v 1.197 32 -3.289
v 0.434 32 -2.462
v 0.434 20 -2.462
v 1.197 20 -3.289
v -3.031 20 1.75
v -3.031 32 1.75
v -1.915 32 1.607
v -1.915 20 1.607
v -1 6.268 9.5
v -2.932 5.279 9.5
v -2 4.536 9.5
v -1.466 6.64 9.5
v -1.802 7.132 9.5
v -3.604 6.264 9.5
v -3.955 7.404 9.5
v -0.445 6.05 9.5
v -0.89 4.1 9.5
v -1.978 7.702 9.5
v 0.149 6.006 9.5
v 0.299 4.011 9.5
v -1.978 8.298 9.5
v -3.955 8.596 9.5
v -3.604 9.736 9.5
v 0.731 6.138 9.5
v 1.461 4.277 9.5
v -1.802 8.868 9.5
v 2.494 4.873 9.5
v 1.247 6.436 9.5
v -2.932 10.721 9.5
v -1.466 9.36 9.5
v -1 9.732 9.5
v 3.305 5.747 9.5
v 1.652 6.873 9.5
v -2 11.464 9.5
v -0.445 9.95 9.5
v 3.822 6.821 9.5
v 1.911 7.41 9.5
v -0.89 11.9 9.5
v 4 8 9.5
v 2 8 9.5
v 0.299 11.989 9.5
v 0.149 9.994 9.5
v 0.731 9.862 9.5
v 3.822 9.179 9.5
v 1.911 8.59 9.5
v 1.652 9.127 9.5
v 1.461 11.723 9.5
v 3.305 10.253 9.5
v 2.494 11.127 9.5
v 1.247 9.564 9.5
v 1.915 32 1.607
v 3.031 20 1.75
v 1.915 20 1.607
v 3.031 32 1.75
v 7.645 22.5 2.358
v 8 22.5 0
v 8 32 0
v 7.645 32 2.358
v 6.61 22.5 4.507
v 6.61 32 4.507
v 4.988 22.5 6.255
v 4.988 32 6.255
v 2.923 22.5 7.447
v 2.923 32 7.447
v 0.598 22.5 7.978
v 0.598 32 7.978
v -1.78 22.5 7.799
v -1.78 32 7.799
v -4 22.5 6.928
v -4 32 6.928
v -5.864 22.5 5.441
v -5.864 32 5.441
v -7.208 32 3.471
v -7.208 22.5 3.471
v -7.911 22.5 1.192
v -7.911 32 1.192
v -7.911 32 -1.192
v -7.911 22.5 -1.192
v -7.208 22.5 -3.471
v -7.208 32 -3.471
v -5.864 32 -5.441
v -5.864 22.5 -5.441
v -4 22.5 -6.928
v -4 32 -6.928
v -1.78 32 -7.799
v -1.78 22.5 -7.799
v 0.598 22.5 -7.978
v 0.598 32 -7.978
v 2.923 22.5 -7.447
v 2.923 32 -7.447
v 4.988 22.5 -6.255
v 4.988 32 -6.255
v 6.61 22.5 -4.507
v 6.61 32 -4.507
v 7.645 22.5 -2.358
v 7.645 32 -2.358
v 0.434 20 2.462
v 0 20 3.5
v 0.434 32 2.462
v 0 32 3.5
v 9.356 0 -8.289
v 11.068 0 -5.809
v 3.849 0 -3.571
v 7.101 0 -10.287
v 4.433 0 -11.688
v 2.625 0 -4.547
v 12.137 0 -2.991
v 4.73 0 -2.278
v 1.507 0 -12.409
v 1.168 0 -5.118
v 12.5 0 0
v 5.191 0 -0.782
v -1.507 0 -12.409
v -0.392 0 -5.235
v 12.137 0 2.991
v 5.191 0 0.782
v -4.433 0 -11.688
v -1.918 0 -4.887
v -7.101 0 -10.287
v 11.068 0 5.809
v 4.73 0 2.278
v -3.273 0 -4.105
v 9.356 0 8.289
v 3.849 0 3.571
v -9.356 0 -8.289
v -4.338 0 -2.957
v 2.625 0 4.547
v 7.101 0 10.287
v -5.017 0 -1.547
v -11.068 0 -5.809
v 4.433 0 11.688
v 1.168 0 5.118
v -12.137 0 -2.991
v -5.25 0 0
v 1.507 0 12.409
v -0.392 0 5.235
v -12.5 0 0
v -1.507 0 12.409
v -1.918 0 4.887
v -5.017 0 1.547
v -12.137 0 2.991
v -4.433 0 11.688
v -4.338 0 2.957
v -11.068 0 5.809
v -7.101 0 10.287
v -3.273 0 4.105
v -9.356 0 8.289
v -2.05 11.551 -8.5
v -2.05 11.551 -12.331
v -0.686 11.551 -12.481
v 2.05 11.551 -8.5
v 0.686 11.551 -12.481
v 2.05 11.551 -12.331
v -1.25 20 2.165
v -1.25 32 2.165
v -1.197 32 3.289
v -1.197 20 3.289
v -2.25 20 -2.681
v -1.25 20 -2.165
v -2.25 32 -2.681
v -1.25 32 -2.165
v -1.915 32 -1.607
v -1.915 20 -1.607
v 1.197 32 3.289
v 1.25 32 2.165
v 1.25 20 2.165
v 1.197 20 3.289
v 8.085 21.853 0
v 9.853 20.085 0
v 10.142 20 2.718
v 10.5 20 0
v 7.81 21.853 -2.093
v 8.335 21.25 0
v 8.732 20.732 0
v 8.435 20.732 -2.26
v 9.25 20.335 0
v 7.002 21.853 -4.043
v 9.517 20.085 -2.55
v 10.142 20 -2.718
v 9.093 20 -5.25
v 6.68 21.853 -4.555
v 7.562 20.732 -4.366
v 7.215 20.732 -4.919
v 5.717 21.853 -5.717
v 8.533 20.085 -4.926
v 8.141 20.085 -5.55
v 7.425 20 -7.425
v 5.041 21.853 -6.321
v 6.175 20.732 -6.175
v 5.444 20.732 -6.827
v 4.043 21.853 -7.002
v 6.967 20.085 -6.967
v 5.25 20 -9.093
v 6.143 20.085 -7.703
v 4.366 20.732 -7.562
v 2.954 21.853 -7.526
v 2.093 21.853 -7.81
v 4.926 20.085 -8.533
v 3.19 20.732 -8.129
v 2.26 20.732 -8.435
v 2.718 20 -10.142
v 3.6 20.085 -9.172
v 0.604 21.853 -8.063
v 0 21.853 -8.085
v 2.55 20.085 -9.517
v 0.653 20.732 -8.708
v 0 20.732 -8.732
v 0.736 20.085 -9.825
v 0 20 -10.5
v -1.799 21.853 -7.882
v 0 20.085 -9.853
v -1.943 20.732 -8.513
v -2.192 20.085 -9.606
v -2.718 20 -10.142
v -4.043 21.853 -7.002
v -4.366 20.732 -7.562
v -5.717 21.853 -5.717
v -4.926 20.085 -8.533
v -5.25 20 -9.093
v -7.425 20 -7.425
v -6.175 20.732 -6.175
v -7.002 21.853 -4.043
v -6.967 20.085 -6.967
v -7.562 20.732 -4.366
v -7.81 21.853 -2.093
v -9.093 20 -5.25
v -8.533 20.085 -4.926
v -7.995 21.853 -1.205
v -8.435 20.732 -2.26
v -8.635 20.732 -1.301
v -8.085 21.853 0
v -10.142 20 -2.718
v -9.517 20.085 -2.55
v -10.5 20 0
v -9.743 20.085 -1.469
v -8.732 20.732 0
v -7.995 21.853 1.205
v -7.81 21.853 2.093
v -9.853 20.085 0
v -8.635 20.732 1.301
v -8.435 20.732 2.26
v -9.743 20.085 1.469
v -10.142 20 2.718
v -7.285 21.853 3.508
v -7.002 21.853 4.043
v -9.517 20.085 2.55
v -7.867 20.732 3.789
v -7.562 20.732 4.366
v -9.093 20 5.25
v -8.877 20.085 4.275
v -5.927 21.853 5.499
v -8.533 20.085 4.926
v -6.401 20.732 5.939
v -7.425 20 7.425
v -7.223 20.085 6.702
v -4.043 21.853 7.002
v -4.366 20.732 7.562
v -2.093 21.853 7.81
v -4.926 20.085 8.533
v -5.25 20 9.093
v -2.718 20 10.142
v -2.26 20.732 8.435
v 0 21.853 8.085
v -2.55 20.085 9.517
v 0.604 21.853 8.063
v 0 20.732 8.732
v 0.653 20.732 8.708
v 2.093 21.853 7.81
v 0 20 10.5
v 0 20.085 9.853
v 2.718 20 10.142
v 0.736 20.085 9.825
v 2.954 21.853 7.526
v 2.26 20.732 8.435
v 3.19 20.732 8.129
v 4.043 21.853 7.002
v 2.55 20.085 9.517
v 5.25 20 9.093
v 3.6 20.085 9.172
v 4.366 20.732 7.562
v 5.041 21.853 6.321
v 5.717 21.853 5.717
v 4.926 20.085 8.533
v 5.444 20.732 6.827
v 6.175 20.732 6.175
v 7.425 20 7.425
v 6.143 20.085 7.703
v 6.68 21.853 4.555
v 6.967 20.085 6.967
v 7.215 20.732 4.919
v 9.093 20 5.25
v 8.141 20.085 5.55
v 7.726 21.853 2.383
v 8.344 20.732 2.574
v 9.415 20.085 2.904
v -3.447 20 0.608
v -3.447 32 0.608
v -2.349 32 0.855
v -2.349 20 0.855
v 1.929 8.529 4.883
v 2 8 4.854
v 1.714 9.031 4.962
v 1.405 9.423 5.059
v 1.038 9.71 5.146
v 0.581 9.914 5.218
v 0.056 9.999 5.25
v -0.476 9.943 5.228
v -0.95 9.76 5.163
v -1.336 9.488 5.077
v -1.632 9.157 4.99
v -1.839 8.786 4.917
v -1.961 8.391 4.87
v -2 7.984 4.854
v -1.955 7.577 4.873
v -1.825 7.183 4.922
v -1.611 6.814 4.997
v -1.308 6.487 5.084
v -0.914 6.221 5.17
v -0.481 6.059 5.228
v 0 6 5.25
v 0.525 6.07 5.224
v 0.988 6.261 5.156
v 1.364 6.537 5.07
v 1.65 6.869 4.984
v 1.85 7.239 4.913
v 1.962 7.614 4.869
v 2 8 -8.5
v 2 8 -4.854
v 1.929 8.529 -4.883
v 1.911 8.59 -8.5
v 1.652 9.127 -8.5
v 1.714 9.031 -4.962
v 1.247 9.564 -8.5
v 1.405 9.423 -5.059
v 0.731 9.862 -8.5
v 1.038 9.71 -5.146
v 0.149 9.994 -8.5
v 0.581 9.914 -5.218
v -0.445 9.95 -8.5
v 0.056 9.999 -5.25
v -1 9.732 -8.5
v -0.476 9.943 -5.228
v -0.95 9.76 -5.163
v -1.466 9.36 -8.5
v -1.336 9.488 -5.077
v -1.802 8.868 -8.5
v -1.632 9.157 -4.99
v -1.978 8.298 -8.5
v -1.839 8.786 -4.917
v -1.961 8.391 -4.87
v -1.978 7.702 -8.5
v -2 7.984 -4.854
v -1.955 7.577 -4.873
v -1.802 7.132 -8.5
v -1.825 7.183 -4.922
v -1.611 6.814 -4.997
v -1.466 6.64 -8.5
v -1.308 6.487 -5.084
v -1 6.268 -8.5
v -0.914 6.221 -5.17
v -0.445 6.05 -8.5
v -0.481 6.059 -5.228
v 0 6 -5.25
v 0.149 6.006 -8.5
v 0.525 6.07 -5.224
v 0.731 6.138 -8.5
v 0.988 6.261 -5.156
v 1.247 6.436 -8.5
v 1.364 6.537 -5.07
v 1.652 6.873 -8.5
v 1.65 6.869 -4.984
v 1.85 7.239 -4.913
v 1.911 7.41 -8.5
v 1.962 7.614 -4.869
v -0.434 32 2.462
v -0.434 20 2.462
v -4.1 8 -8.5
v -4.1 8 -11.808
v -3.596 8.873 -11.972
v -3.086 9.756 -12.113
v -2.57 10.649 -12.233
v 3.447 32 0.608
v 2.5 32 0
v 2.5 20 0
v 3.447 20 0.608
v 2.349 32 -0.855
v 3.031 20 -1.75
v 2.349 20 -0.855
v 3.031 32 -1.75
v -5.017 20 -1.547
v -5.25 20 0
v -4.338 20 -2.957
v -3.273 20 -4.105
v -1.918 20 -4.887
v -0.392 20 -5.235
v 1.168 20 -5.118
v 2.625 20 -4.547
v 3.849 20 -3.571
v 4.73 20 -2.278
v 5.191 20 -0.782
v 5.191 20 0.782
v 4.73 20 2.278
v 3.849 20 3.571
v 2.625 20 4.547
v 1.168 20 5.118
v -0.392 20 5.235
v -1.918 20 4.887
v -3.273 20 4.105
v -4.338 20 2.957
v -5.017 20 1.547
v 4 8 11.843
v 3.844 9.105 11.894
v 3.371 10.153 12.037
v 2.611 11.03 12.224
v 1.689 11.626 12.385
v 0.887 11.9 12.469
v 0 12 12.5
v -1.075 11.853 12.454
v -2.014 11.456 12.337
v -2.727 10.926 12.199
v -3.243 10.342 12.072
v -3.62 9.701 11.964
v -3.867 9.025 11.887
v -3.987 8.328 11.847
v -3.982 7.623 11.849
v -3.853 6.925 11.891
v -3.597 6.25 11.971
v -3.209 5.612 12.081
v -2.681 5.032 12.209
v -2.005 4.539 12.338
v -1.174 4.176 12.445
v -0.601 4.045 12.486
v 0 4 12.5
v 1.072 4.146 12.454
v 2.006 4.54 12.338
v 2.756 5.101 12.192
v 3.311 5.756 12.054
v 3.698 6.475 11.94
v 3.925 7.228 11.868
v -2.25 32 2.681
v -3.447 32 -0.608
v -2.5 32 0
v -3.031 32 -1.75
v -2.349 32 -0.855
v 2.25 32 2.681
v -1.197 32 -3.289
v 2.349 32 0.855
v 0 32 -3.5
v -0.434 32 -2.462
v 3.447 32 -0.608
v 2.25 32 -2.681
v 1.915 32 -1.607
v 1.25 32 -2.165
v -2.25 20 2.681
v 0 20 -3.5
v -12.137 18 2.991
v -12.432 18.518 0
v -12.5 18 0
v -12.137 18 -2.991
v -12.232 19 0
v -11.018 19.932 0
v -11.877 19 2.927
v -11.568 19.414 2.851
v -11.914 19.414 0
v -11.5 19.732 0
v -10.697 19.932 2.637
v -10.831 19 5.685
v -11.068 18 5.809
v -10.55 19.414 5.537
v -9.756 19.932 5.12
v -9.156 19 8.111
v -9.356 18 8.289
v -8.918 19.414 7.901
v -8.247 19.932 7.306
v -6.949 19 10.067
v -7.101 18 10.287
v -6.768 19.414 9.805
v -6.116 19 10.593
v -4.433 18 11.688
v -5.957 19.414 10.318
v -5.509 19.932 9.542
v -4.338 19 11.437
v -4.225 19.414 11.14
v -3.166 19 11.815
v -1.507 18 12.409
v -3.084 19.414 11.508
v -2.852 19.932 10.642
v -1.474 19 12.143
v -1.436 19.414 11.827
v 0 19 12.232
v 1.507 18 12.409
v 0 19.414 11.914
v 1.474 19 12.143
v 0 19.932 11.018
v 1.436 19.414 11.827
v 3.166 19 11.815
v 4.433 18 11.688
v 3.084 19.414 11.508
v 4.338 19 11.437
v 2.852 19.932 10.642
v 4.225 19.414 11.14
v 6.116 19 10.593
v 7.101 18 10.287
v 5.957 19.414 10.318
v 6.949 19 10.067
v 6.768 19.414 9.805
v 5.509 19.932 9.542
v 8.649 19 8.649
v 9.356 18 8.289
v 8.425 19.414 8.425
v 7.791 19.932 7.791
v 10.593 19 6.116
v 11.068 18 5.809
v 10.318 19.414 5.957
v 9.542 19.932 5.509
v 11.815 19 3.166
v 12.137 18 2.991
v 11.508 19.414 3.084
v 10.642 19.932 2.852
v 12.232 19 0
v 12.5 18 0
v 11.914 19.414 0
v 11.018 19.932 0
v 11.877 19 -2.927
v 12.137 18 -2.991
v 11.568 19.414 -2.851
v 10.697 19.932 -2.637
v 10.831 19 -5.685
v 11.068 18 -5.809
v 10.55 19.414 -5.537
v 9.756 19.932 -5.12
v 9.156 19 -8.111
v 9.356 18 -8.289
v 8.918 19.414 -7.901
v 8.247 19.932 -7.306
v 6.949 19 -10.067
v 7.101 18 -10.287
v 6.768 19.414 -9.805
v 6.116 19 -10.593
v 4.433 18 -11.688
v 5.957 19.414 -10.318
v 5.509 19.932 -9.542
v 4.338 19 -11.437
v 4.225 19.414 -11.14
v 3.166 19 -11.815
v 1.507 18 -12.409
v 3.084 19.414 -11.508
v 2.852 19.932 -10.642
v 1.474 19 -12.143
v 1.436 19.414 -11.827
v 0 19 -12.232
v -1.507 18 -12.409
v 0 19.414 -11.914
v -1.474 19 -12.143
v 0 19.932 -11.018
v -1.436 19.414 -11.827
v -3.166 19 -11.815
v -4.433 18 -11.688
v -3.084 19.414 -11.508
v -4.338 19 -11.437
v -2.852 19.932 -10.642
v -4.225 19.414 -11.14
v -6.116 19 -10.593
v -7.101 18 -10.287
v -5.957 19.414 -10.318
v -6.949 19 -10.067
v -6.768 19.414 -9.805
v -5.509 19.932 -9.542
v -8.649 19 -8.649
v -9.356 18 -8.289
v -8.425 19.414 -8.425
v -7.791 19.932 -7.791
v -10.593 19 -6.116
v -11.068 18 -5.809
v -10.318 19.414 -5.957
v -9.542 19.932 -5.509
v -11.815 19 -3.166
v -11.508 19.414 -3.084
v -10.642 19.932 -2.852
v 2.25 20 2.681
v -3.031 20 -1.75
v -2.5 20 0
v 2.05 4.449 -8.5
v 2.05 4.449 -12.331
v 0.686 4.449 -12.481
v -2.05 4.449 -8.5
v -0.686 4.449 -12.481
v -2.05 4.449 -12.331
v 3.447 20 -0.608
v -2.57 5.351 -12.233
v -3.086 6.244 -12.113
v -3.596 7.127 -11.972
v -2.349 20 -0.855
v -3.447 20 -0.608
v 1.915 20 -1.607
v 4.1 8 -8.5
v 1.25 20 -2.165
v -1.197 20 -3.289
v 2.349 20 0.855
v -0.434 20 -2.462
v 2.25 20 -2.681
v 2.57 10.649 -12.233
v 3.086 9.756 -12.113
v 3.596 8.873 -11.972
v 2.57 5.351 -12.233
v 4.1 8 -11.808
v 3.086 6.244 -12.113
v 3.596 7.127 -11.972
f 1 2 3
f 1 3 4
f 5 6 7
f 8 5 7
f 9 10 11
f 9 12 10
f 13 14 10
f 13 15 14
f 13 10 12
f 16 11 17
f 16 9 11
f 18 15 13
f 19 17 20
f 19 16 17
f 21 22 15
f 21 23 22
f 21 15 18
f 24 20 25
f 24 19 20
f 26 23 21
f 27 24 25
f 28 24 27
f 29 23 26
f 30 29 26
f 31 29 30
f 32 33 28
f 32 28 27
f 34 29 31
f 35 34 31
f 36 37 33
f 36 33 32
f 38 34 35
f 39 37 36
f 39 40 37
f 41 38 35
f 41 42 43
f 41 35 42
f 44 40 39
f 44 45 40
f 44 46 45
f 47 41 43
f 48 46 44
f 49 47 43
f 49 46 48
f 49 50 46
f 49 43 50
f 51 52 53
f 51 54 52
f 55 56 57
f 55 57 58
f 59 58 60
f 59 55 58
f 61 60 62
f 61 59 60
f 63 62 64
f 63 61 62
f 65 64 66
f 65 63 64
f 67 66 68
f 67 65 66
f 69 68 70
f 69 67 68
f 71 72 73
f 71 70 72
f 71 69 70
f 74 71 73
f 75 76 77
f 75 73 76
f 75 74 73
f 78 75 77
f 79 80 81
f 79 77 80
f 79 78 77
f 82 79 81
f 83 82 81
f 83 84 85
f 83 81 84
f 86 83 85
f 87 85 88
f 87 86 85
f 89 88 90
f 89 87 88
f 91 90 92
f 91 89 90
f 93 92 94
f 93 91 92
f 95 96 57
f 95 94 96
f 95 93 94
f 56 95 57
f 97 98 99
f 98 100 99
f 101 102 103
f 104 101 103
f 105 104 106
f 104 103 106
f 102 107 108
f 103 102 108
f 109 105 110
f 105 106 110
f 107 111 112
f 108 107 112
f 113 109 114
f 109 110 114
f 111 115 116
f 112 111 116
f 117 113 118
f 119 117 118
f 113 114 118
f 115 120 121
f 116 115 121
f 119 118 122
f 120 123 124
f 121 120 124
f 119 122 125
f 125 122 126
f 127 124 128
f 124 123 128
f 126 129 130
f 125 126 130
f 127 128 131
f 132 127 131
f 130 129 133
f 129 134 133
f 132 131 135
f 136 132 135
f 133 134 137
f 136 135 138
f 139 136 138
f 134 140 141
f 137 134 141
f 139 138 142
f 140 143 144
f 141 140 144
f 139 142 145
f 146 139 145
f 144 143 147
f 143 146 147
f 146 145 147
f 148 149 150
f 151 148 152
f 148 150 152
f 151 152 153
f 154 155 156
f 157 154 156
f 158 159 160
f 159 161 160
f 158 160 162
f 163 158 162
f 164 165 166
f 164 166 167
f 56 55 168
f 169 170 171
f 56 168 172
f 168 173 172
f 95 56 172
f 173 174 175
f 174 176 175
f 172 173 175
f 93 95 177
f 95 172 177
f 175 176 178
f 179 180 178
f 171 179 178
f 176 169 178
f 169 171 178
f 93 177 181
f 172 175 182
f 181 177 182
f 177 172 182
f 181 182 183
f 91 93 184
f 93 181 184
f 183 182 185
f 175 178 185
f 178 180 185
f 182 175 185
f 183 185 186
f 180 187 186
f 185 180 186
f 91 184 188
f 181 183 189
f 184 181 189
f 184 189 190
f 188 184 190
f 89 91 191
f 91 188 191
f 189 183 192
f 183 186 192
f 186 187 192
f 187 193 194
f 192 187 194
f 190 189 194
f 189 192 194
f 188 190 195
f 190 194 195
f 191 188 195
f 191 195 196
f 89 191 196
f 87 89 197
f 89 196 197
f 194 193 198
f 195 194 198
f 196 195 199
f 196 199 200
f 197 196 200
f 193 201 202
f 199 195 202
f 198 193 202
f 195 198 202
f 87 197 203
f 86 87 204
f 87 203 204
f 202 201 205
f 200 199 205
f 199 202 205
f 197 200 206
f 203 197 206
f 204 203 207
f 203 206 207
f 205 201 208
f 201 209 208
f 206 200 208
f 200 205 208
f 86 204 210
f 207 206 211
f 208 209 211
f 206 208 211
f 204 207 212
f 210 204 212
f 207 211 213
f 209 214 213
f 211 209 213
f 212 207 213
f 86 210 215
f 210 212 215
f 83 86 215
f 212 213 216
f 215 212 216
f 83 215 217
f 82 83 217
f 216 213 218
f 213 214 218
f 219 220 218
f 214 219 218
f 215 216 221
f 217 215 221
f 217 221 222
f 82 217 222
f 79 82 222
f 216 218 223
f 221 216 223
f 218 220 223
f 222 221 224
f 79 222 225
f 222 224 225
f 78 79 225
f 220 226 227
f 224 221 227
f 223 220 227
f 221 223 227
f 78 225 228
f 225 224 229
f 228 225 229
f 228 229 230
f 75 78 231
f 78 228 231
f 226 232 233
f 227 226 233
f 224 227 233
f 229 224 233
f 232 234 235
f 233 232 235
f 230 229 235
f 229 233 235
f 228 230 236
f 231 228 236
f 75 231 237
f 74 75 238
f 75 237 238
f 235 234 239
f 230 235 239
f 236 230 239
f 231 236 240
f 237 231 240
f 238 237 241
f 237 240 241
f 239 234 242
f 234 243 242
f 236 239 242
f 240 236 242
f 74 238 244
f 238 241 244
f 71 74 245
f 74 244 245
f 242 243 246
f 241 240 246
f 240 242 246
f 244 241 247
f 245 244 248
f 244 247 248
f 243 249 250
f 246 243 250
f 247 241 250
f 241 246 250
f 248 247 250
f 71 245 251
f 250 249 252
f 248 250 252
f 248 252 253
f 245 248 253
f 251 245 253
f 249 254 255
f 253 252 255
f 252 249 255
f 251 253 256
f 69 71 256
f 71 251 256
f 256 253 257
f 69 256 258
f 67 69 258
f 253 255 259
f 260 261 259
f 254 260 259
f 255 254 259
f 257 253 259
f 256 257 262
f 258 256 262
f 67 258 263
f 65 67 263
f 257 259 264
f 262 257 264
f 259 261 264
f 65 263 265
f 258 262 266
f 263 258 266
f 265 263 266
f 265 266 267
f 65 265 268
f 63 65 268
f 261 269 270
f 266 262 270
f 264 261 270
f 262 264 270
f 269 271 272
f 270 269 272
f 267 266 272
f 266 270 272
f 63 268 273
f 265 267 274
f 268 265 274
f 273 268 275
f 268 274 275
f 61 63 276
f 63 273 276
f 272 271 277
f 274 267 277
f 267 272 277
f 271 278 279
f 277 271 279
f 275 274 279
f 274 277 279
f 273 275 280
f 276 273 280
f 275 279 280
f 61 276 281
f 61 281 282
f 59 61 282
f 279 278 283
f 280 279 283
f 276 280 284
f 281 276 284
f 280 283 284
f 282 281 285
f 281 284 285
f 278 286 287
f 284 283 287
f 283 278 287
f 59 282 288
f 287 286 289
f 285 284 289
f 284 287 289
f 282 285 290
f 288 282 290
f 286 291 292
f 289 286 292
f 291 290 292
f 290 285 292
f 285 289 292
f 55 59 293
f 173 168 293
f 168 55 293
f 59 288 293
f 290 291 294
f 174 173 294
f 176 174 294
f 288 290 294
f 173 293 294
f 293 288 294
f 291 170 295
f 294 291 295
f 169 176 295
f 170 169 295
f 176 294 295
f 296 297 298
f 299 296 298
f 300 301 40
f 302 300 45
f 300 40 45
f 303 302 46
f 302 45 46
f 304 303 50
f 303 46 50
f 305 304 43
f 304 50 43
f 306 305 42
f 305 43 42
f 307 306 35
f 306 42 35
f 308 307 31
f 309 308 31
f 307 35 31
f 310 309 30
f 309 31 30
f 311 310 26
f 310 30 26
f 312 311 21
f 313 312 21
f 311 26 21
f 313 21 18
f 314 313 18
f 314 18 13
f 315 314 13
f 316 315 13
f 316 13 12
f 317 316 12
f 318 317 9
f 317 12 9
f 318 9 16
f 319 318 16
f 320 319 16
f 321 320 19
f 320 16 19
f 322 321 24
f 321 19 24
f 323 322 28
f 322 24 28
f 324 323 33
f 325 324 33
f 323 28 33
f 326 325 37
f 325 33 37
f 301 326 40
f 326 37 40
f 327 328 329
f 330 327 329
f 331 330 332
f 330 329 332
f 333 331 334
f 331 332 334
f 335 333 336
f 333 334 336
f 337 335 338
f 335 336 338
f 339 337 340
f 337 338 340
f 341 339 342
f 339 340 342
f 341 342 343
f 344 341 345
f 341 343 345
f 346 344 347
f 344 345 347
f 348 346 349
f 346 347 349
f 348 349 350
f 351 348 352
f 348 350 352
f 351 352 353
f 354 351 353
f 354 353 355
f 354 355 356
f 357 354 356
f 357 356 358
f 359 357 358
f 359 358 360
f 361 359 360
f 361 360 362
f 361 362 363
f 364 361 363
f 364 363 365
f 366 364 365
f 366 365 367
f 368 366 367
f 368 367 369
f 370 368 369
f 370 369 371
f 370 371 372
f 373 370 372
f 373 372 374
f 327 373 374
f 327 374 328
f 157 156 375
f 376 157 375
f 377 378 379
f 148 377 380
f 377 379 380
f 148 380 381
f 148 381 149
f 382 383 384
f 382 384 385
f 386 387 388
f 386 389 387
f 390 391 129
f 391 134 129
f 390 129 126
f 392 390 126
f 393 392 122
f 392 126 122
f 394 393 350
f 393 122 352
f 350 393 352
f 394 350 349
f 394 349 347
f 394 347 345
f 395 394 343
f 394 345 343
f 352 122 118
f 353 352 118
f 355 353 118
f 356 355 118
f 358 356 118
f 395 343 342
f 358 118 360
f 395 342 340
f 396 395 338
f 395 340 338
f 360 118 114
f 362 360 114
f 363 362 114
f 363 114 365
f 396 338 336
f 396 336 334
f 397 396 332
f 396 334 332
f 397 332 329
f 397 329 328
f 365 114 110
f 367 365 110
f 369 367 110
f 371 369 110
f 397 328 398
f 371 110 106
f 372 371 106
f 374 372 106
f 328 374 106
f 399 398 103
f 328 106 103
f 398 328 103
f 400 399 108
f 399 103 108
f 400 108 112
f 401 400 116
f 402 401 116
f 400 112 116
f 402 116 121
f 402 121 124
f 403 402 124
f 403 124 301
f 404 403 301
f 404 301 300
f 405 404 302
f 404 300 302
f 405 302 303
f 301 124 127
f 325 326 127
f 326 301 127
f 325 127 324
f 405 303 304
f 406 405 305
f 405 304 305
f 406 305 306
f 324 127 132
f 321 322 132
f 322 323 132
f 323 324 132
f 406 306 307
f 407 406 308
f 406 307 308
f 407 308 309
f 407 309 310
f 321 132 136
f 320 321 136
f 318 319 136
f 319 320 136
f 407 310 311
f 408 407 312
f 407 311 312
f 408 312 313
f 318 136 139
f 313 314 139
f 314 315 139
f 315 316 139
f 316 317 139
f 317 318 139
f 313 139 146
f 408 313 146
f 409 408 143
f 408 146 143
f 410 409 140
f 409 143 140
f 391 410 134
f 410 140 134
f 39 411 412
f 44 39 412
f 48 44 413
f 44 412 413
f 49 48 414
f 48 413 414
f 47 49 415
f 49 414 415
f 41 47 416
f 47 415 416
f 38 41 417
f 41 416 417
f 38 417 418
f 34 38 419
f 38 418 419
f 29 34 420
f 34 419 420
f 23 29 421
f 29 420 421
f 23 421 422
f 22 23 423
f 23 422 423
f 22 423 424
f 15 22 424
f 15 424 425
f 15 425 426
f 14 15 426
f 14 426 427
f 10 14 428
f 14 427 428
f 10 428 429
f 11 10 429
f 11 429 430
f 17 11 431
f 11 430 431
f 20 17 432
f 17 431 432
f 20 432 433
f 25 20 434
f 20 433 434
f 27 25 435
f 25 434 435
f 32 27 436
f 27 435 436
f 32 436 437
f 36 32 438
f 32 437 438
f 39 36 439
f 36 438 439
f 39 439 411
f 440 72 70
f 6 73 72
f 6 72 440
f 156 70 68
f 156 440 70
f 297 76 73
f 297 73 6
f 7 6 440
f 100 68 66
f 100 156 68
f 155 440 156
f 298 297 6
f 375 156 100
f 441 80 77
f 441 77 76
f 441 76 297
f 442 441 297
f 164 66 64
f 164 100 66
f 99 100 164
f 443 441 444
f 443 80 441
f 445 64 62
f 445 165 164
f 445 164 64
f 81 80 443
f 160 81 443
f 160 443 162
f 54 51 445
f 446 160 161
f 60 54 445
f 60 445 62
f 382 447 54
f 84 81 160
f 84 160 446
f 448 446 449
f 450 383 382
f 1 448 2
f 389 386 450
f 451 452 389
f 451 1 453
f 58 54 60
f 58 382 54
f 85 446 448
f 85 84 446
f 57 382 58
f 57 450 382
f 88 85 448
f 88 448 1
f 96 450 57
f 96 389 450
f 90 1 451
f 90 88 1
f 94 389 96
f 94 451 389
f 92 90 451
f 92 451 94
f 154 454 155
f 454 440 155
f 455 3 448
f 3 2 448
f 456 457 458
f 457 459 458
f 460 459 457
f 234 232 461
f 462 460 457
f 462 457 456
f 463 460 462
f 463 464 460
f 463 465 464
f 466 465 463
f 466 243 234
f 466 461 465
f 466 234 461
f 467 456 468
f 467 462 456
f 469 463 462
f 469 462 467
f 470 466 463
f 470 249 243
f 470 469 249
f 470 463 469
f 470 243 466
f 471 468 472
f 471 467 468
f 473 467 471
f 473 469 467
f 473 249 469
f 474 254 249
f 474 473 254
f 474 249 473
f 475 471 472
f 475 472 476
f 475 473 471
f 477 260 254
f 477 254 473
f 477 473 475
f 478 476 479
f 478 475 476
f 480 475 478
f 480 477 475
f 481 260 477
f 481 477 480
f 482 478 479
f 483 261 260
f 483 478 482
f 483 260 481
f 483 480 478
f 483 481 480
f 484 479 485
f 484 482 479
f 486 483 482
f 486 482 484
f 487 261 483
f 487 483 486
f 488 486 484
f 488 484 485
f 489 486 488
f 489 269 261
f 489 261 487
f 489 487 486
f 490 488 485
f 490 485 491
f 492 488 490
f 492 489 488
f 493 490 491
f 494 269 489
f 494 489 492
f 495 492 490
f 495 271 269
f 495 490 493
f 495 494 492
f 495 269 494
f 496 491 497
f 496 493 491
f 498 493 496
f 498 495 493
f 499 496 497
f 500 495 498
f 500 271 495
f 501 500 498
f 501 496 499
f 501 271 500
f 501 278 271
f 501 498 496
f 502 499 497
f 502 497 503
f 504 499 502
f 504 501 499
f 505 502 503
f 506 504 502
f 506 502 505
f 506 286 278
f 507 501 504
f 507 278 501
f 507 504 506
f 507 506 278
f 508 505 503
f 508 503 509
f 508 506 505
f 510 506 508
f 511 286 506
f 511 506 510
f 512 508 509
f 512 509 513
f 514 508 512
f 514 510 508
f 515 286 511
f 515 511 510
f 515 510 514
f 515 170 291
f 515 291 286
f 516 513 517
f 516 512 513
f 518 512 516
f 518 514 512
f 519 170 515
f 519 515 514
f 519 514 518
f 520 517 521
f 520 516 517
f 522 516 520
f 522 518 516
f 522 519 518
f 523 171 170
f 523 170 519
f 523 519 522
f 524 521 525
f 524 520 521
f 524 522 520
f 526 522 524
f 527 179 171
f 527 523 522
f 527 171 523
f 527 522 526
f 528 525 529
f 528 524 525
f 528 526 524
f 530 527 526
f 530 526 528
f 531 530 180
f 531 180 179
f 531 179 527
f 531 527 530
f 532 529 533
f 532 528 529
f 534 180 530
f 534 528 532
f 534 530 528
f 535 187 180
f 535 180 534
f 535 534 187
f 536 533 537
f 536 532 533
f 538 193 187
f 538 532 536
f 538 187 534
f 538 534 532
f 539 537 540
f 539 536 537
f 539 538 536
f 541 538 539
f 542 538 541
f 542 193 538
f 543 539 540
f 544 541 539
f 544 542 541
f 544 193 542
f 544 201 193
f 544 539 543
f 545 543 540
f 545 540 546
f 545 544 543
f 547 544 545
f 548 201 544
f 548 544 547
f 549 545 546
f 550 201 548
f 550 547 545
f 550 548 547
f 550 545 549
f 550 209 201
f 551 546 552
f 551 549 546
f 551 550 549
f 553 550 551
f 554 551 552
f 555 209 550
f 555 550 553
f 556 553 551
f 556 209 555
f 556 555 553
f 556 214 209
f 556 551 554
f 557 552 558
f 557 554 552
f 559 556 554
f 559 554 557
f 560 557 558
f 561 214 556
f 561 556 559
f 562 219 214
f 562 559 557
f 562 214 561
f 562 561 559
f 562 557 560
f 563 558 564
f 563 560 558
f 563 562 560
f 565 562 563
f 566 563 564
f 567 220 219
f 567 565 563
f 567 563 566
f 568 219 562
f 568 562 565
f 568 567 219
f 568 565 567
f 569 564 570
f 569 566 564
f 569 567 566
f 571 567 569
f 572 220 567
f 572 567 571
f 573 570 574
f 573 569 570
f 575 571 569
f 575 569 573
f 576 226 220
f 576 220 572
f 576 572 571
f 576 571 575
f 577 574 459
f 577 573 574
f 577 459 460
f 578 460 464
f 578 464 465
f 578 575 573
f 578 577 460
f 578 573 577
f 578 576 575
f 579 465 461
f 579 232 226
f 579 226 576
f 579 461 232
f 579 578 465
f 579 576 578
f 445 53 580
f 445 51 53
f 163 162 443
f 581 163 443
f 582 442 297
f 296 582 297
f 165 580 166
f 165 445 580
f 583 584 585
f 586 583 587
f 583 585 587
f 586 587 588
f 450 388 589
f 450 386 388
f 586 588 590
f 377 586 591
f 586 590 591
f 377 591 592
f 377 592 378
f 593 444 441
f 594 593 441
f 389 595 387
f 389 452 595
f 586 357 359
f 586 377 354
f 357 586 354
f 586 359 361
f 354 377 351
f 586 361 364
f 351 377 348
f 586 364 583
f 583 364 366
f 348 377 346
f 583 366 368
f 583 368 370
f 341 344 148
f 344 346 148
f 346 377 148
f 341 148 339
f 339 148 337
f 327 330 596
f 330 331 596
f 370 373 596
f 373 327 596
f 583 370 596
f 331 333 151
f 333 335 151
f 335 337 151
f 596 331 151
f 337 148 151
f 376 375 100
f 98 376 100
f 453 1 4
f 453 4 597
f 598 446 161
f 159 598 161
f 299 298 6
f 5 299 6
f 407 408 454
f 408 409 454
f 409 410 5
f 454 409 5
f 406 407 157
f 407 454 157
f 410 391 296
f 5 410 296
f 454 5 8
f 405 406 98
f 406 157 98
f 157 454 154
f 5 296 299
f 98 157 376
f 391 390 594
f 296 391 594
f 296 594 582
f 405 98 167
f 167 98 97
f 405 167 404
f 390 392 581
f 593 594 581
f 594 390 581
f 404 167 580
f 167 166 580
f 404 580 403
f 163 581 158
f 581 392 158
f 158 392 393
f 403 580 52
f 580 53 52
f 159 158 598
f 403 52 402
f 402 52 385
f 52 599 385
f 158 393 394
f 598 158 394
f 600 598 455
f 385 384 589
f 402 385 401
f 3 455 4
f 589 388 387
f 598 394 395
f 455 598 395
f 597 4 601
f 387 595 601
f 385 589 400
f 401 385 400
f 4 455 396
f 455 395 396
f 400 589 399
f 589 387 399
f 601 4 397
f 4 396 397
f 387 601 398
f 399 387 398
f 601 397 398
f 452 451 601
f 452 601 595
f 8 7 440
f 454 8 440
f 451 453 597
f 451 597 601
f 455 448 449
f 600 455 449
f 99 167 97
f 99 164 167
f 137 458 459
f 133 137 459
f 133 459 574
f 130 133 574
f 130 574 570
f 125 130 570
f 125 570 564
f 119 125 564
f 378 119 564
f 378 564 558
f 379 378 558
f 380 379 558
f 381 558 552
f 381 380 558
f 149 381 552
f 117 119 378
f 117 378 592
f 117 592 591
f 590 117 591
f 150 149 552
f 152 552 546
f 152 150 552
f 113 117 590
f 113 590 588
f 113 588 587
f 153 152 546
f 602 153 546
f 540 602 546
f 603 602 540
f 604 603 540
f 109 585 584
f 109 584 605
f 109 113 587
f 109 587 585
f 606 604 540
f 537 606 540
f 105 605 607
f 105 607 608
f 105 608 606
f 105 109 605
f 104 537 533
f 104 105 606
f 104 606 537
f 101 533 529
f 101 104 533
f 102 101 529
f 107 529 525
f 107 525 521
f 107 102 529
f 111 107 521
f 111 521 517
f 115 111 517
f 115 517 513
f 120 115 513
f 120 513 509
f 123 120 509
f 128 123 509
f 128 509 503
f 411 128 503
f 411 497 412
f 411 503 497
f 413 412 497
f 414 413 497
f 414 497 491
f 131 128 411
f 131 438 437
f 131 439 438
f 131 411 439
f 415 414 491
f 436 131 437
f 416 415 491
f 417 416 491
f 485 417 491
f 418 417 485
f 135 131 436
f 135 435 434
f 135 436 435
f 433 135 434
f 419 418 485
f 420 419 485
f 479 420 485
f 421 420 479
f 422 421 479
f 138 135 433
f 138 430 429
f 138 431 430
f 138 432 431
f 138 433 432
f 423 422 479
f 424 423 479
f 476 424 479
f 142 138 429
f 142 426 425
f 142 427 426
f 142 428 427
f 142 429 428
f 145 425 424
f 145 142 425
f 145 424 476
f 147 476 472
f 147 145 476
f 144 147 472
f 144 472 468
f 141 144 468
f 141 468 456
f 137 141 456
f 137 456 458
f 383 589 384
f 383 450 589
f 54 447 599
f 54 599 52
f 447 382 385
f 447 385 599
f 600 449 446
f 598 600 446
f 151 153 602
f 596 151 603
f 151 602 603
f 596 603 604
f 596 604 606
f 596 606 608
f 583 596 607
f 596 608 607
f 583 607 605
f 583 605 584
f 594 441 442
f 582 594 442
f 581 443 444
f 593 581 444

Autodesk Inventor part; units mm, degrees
sketch "스케치1" plane through (0, 0, 0) normal (0, 1, 0) x (-1, 0, 0)
  line L0 (17.5, 0) -> (-17.5, 0) projected
  line L1 (0, -17.5) -> (0, 17.5) projected
  circle A0 centre (0, 0) radius 5.25
  circle A1 centre (0, 0) radius 12.5
  dimension "d0" = 10.5
  dimension "d1" = 25
extrude "돌출1" add sketch "스케치1" along normal blind 20 contours A1 L1 A0 L0 | L0 A0 L1 A1 | L1 A0 L0 A1 | A1 L0 A0 L1
ref_plane "작업 평면1" through (0, 0, 12.5) normal (0, 0, 1) x (1, 0, 0)
sketch "스케치2" plane through (0, 0, 12.5) normal (0, 0, 1) x (1, 0, 0)
  line L0 (0, 0) -> (0, 8)
  circle A0 centre (0, 8) radius 2
  dimension "d5" = 8
  dimension "d6" = 4
extrude "돌출2" cut sketch "스케치2" against normal blind 40
sketch "스케치3" plane through (0, 0, 12.5) normal (0, 0, 1) x (1, 0, 0)
  line L0 (0, 0) -> (0, 8)
  circle A0 centre (0, 8) radius 4
  point P0 (0, 6)
  point P1 (0, 10)
  dimension "d10" = 8
  dimension "d11" = 8
extrude "돌출3" cut sketch "스케치3" against normal blind 3
ref_plane "작업 평면2" through (0, 0, -12.5) normal (0, 0, 1) x (1, 0, 0)
sketch "스케치4" plane through (0, 0, -12.5) normal (0, 0, 1) x (1, 0, 0)
  line L0 (0, 0) -> (0, 8)
  circle A0 centre (0, 8) radius 2 projected
  line L1 (0, 8) -> (-2.05, 4.4493)
  line L2 (0, 8) -> (2.05, 4.4493)
  line L3 (2.05, 4.4493) -> (-2.05, 4.4493)
  line L4 (4.1, 8) -> (2.05, 4.4493)
  line L5 (2.05, 11.5507) -> (4.1, 8)
  line L6 (-2.05, 11.5507) -> (2.05, 11.5507)
  line L7 (-4.1, 8) -> (-2.05, 11.5507)
  line L8 (-2.05, 4.4493) -> (-4.1, 8)
  point P0 (2.05, 4.4493)
  point P1 (4.1, 8)
  point P2 (2.05, 11.5507)
  point P3 (-2.05, 11.5507)
  point P4 (-4.1, 8)
  point P5 (-2.05, 4.4493)
  dimension "d15" = 8
  dimension "d16" = 4.1
  dimension "d17" = 30
  dimension "d20" = 360
extrude "돌출4" cut sketch "스케치4" along normal blind 4
fillet "모깎기1" radius 2 1 edges at (12.5, 20, 0)
sketch "스케치6" plane through (0, 0, 0) normal (0, 0, 1) x (1, 0, 0)
  line L0 (8, 32) -> (8, 22.5)
  line L1 (-15.1828, 0) -> (17.5971, 0) projected
  line L2 (0, -6.4) -> (0, 38.4) projected
  arc A0 (12.5, 18) -> (10.5, 20) centre (10.5, 18) ccw projected
  arc A1 (8, 22.5) -> (10.5, 20) centre (10.5, 22.5) ccw
  line L3 (-10.5, 20) -> (10.5, 20) projected
  line L4 (8, 32) -> (0, 32)
  point P0 (0, 0)
  point P1 (0, 20)
  dimension "d24" = 8
  dimension "d26" = 12
revolve "회전1" add sketch "스케치6" angle 360 about axis through (0, -10, 0) along (0, 1, 0)
ref_plane "작업 평면3" through (0, 0, 8) normal (0, 0, 1) x (1, 0, 0)
sketch "스케치8" plane through (0, 32, 0) normal (0, 1, 0) x (1, 0, 0)
  circle A0 centre (0, 0) radius 2.5
  line L0 (0, 3.5) -> (-0.4341, 2.462)
  line L1 (-0.4341, 2.462) -> (0, 3.5)
  line L2 (0, 17.5005) -> (0, -17.5027) projected
  line L3 (0.4341, 2.462) -> (0, 3.5)
  line L4 (-1.1971, 3.2889) -> (-1.25, 2.1651)
  line L5 (-0.4341, 2.462) -> (-1.1971, 3.2889)
  line L6 (-2.2498, 2.6812) -> (-1.9151, 1.607)
  line L7 (-1.25, 2.1651) -> (-2.2498, 2.6812)
  line L8 (-3.0311, 1.75) -> (-2.3492, 0.8551)
  line L9 (-1.9151, 1.607) -> (-3.0311, 1.75)
  line L10 (-3.4468, 0.6078) -> (-2.5, 0)
  line L11 (-2.3492, 0.8551) -> (-3.4468, 0.6078)
  line L12 (-3.4468, -0.6078) -> (-2.3492, -0.8551)
  line L13 (-2.5, 0) -> (-3.4468, -0.6078)
  line L14 (-3.0311, -1.75) -> (-1.9151, -1.607)
  line L15 (-2.3492, -0.8551) -> (-3.0311, -1.75)
  line L16 (-2.2498, -2.6812) -> (-1.25, -2.1651)
  line L17 (-1.9151, -1.607) -> (-2.2498, -2.6812)
  line L18 (-1.1971, -3.2889) -> (-0.4341, -2.462)
  line L19 (-1.25, -2.1651) -> (-1.1971, -3.2889)
  line L20 (0, -3.5) -> (0.4341, -2.462)
  line L21 (-0.4341, -2.462) -> (0, -3.5)
  line L22 (1.1971, 3.2889) -> (1.25, 2.1651)
  line L23 (0.4341, 2.462) -> (1.1971, 3.2889)
  line L24 (2.2498, 2.6812) -> (1.9151, 1.607)
  line L25 (1.25, 2.1651) -> (2.2498, 2.6812)
  line L26 (3.0311, 1.75) -> (2.3492, 0.8551)
  line L27 (1.9151, 1.607) -> (3.0311, 1.75)
  line L28 (3.4468, 0.6078) -> (2.5, 0)
  line L29 (2.3492, 0.8551) -> (3.4468, 0.6078)
  line L30 (3.4468, -0.6078) -> (2.3492, -0.8551)
  line L31 (2.5, 0) -> (3.4468, -0.6078)
  line L32 (3.0311, -1.75) -> (1.9151, -1.607)
  line L33 (2.3492, -0.8551) -> (3.0311, -1.75)
  line L34 (2.2498, -2.6812) -> (1.25, -2.1651)
  line L35 (1.9151, -1.607) -> (2.2498, -2.6812)
  line L36 (1.1971, -3.2889) -> (0.4341, -2.462)
  line L37 (1.25, -2.1651) -> (1.1971, -3.2889)
  line L38 (0, 2.5) -> (0, 3.5)
  point P0 (-2.5, 0)
  point P1 (2.5, 0)
  dimension "d33" = 5
  dimension "d36" = 180
  dimension "d38" = 1
extrude "돌출6" cut sketch "스케치8" against normal up to surface (12 mm away)
properties part number "가변저항-조향 연결"
